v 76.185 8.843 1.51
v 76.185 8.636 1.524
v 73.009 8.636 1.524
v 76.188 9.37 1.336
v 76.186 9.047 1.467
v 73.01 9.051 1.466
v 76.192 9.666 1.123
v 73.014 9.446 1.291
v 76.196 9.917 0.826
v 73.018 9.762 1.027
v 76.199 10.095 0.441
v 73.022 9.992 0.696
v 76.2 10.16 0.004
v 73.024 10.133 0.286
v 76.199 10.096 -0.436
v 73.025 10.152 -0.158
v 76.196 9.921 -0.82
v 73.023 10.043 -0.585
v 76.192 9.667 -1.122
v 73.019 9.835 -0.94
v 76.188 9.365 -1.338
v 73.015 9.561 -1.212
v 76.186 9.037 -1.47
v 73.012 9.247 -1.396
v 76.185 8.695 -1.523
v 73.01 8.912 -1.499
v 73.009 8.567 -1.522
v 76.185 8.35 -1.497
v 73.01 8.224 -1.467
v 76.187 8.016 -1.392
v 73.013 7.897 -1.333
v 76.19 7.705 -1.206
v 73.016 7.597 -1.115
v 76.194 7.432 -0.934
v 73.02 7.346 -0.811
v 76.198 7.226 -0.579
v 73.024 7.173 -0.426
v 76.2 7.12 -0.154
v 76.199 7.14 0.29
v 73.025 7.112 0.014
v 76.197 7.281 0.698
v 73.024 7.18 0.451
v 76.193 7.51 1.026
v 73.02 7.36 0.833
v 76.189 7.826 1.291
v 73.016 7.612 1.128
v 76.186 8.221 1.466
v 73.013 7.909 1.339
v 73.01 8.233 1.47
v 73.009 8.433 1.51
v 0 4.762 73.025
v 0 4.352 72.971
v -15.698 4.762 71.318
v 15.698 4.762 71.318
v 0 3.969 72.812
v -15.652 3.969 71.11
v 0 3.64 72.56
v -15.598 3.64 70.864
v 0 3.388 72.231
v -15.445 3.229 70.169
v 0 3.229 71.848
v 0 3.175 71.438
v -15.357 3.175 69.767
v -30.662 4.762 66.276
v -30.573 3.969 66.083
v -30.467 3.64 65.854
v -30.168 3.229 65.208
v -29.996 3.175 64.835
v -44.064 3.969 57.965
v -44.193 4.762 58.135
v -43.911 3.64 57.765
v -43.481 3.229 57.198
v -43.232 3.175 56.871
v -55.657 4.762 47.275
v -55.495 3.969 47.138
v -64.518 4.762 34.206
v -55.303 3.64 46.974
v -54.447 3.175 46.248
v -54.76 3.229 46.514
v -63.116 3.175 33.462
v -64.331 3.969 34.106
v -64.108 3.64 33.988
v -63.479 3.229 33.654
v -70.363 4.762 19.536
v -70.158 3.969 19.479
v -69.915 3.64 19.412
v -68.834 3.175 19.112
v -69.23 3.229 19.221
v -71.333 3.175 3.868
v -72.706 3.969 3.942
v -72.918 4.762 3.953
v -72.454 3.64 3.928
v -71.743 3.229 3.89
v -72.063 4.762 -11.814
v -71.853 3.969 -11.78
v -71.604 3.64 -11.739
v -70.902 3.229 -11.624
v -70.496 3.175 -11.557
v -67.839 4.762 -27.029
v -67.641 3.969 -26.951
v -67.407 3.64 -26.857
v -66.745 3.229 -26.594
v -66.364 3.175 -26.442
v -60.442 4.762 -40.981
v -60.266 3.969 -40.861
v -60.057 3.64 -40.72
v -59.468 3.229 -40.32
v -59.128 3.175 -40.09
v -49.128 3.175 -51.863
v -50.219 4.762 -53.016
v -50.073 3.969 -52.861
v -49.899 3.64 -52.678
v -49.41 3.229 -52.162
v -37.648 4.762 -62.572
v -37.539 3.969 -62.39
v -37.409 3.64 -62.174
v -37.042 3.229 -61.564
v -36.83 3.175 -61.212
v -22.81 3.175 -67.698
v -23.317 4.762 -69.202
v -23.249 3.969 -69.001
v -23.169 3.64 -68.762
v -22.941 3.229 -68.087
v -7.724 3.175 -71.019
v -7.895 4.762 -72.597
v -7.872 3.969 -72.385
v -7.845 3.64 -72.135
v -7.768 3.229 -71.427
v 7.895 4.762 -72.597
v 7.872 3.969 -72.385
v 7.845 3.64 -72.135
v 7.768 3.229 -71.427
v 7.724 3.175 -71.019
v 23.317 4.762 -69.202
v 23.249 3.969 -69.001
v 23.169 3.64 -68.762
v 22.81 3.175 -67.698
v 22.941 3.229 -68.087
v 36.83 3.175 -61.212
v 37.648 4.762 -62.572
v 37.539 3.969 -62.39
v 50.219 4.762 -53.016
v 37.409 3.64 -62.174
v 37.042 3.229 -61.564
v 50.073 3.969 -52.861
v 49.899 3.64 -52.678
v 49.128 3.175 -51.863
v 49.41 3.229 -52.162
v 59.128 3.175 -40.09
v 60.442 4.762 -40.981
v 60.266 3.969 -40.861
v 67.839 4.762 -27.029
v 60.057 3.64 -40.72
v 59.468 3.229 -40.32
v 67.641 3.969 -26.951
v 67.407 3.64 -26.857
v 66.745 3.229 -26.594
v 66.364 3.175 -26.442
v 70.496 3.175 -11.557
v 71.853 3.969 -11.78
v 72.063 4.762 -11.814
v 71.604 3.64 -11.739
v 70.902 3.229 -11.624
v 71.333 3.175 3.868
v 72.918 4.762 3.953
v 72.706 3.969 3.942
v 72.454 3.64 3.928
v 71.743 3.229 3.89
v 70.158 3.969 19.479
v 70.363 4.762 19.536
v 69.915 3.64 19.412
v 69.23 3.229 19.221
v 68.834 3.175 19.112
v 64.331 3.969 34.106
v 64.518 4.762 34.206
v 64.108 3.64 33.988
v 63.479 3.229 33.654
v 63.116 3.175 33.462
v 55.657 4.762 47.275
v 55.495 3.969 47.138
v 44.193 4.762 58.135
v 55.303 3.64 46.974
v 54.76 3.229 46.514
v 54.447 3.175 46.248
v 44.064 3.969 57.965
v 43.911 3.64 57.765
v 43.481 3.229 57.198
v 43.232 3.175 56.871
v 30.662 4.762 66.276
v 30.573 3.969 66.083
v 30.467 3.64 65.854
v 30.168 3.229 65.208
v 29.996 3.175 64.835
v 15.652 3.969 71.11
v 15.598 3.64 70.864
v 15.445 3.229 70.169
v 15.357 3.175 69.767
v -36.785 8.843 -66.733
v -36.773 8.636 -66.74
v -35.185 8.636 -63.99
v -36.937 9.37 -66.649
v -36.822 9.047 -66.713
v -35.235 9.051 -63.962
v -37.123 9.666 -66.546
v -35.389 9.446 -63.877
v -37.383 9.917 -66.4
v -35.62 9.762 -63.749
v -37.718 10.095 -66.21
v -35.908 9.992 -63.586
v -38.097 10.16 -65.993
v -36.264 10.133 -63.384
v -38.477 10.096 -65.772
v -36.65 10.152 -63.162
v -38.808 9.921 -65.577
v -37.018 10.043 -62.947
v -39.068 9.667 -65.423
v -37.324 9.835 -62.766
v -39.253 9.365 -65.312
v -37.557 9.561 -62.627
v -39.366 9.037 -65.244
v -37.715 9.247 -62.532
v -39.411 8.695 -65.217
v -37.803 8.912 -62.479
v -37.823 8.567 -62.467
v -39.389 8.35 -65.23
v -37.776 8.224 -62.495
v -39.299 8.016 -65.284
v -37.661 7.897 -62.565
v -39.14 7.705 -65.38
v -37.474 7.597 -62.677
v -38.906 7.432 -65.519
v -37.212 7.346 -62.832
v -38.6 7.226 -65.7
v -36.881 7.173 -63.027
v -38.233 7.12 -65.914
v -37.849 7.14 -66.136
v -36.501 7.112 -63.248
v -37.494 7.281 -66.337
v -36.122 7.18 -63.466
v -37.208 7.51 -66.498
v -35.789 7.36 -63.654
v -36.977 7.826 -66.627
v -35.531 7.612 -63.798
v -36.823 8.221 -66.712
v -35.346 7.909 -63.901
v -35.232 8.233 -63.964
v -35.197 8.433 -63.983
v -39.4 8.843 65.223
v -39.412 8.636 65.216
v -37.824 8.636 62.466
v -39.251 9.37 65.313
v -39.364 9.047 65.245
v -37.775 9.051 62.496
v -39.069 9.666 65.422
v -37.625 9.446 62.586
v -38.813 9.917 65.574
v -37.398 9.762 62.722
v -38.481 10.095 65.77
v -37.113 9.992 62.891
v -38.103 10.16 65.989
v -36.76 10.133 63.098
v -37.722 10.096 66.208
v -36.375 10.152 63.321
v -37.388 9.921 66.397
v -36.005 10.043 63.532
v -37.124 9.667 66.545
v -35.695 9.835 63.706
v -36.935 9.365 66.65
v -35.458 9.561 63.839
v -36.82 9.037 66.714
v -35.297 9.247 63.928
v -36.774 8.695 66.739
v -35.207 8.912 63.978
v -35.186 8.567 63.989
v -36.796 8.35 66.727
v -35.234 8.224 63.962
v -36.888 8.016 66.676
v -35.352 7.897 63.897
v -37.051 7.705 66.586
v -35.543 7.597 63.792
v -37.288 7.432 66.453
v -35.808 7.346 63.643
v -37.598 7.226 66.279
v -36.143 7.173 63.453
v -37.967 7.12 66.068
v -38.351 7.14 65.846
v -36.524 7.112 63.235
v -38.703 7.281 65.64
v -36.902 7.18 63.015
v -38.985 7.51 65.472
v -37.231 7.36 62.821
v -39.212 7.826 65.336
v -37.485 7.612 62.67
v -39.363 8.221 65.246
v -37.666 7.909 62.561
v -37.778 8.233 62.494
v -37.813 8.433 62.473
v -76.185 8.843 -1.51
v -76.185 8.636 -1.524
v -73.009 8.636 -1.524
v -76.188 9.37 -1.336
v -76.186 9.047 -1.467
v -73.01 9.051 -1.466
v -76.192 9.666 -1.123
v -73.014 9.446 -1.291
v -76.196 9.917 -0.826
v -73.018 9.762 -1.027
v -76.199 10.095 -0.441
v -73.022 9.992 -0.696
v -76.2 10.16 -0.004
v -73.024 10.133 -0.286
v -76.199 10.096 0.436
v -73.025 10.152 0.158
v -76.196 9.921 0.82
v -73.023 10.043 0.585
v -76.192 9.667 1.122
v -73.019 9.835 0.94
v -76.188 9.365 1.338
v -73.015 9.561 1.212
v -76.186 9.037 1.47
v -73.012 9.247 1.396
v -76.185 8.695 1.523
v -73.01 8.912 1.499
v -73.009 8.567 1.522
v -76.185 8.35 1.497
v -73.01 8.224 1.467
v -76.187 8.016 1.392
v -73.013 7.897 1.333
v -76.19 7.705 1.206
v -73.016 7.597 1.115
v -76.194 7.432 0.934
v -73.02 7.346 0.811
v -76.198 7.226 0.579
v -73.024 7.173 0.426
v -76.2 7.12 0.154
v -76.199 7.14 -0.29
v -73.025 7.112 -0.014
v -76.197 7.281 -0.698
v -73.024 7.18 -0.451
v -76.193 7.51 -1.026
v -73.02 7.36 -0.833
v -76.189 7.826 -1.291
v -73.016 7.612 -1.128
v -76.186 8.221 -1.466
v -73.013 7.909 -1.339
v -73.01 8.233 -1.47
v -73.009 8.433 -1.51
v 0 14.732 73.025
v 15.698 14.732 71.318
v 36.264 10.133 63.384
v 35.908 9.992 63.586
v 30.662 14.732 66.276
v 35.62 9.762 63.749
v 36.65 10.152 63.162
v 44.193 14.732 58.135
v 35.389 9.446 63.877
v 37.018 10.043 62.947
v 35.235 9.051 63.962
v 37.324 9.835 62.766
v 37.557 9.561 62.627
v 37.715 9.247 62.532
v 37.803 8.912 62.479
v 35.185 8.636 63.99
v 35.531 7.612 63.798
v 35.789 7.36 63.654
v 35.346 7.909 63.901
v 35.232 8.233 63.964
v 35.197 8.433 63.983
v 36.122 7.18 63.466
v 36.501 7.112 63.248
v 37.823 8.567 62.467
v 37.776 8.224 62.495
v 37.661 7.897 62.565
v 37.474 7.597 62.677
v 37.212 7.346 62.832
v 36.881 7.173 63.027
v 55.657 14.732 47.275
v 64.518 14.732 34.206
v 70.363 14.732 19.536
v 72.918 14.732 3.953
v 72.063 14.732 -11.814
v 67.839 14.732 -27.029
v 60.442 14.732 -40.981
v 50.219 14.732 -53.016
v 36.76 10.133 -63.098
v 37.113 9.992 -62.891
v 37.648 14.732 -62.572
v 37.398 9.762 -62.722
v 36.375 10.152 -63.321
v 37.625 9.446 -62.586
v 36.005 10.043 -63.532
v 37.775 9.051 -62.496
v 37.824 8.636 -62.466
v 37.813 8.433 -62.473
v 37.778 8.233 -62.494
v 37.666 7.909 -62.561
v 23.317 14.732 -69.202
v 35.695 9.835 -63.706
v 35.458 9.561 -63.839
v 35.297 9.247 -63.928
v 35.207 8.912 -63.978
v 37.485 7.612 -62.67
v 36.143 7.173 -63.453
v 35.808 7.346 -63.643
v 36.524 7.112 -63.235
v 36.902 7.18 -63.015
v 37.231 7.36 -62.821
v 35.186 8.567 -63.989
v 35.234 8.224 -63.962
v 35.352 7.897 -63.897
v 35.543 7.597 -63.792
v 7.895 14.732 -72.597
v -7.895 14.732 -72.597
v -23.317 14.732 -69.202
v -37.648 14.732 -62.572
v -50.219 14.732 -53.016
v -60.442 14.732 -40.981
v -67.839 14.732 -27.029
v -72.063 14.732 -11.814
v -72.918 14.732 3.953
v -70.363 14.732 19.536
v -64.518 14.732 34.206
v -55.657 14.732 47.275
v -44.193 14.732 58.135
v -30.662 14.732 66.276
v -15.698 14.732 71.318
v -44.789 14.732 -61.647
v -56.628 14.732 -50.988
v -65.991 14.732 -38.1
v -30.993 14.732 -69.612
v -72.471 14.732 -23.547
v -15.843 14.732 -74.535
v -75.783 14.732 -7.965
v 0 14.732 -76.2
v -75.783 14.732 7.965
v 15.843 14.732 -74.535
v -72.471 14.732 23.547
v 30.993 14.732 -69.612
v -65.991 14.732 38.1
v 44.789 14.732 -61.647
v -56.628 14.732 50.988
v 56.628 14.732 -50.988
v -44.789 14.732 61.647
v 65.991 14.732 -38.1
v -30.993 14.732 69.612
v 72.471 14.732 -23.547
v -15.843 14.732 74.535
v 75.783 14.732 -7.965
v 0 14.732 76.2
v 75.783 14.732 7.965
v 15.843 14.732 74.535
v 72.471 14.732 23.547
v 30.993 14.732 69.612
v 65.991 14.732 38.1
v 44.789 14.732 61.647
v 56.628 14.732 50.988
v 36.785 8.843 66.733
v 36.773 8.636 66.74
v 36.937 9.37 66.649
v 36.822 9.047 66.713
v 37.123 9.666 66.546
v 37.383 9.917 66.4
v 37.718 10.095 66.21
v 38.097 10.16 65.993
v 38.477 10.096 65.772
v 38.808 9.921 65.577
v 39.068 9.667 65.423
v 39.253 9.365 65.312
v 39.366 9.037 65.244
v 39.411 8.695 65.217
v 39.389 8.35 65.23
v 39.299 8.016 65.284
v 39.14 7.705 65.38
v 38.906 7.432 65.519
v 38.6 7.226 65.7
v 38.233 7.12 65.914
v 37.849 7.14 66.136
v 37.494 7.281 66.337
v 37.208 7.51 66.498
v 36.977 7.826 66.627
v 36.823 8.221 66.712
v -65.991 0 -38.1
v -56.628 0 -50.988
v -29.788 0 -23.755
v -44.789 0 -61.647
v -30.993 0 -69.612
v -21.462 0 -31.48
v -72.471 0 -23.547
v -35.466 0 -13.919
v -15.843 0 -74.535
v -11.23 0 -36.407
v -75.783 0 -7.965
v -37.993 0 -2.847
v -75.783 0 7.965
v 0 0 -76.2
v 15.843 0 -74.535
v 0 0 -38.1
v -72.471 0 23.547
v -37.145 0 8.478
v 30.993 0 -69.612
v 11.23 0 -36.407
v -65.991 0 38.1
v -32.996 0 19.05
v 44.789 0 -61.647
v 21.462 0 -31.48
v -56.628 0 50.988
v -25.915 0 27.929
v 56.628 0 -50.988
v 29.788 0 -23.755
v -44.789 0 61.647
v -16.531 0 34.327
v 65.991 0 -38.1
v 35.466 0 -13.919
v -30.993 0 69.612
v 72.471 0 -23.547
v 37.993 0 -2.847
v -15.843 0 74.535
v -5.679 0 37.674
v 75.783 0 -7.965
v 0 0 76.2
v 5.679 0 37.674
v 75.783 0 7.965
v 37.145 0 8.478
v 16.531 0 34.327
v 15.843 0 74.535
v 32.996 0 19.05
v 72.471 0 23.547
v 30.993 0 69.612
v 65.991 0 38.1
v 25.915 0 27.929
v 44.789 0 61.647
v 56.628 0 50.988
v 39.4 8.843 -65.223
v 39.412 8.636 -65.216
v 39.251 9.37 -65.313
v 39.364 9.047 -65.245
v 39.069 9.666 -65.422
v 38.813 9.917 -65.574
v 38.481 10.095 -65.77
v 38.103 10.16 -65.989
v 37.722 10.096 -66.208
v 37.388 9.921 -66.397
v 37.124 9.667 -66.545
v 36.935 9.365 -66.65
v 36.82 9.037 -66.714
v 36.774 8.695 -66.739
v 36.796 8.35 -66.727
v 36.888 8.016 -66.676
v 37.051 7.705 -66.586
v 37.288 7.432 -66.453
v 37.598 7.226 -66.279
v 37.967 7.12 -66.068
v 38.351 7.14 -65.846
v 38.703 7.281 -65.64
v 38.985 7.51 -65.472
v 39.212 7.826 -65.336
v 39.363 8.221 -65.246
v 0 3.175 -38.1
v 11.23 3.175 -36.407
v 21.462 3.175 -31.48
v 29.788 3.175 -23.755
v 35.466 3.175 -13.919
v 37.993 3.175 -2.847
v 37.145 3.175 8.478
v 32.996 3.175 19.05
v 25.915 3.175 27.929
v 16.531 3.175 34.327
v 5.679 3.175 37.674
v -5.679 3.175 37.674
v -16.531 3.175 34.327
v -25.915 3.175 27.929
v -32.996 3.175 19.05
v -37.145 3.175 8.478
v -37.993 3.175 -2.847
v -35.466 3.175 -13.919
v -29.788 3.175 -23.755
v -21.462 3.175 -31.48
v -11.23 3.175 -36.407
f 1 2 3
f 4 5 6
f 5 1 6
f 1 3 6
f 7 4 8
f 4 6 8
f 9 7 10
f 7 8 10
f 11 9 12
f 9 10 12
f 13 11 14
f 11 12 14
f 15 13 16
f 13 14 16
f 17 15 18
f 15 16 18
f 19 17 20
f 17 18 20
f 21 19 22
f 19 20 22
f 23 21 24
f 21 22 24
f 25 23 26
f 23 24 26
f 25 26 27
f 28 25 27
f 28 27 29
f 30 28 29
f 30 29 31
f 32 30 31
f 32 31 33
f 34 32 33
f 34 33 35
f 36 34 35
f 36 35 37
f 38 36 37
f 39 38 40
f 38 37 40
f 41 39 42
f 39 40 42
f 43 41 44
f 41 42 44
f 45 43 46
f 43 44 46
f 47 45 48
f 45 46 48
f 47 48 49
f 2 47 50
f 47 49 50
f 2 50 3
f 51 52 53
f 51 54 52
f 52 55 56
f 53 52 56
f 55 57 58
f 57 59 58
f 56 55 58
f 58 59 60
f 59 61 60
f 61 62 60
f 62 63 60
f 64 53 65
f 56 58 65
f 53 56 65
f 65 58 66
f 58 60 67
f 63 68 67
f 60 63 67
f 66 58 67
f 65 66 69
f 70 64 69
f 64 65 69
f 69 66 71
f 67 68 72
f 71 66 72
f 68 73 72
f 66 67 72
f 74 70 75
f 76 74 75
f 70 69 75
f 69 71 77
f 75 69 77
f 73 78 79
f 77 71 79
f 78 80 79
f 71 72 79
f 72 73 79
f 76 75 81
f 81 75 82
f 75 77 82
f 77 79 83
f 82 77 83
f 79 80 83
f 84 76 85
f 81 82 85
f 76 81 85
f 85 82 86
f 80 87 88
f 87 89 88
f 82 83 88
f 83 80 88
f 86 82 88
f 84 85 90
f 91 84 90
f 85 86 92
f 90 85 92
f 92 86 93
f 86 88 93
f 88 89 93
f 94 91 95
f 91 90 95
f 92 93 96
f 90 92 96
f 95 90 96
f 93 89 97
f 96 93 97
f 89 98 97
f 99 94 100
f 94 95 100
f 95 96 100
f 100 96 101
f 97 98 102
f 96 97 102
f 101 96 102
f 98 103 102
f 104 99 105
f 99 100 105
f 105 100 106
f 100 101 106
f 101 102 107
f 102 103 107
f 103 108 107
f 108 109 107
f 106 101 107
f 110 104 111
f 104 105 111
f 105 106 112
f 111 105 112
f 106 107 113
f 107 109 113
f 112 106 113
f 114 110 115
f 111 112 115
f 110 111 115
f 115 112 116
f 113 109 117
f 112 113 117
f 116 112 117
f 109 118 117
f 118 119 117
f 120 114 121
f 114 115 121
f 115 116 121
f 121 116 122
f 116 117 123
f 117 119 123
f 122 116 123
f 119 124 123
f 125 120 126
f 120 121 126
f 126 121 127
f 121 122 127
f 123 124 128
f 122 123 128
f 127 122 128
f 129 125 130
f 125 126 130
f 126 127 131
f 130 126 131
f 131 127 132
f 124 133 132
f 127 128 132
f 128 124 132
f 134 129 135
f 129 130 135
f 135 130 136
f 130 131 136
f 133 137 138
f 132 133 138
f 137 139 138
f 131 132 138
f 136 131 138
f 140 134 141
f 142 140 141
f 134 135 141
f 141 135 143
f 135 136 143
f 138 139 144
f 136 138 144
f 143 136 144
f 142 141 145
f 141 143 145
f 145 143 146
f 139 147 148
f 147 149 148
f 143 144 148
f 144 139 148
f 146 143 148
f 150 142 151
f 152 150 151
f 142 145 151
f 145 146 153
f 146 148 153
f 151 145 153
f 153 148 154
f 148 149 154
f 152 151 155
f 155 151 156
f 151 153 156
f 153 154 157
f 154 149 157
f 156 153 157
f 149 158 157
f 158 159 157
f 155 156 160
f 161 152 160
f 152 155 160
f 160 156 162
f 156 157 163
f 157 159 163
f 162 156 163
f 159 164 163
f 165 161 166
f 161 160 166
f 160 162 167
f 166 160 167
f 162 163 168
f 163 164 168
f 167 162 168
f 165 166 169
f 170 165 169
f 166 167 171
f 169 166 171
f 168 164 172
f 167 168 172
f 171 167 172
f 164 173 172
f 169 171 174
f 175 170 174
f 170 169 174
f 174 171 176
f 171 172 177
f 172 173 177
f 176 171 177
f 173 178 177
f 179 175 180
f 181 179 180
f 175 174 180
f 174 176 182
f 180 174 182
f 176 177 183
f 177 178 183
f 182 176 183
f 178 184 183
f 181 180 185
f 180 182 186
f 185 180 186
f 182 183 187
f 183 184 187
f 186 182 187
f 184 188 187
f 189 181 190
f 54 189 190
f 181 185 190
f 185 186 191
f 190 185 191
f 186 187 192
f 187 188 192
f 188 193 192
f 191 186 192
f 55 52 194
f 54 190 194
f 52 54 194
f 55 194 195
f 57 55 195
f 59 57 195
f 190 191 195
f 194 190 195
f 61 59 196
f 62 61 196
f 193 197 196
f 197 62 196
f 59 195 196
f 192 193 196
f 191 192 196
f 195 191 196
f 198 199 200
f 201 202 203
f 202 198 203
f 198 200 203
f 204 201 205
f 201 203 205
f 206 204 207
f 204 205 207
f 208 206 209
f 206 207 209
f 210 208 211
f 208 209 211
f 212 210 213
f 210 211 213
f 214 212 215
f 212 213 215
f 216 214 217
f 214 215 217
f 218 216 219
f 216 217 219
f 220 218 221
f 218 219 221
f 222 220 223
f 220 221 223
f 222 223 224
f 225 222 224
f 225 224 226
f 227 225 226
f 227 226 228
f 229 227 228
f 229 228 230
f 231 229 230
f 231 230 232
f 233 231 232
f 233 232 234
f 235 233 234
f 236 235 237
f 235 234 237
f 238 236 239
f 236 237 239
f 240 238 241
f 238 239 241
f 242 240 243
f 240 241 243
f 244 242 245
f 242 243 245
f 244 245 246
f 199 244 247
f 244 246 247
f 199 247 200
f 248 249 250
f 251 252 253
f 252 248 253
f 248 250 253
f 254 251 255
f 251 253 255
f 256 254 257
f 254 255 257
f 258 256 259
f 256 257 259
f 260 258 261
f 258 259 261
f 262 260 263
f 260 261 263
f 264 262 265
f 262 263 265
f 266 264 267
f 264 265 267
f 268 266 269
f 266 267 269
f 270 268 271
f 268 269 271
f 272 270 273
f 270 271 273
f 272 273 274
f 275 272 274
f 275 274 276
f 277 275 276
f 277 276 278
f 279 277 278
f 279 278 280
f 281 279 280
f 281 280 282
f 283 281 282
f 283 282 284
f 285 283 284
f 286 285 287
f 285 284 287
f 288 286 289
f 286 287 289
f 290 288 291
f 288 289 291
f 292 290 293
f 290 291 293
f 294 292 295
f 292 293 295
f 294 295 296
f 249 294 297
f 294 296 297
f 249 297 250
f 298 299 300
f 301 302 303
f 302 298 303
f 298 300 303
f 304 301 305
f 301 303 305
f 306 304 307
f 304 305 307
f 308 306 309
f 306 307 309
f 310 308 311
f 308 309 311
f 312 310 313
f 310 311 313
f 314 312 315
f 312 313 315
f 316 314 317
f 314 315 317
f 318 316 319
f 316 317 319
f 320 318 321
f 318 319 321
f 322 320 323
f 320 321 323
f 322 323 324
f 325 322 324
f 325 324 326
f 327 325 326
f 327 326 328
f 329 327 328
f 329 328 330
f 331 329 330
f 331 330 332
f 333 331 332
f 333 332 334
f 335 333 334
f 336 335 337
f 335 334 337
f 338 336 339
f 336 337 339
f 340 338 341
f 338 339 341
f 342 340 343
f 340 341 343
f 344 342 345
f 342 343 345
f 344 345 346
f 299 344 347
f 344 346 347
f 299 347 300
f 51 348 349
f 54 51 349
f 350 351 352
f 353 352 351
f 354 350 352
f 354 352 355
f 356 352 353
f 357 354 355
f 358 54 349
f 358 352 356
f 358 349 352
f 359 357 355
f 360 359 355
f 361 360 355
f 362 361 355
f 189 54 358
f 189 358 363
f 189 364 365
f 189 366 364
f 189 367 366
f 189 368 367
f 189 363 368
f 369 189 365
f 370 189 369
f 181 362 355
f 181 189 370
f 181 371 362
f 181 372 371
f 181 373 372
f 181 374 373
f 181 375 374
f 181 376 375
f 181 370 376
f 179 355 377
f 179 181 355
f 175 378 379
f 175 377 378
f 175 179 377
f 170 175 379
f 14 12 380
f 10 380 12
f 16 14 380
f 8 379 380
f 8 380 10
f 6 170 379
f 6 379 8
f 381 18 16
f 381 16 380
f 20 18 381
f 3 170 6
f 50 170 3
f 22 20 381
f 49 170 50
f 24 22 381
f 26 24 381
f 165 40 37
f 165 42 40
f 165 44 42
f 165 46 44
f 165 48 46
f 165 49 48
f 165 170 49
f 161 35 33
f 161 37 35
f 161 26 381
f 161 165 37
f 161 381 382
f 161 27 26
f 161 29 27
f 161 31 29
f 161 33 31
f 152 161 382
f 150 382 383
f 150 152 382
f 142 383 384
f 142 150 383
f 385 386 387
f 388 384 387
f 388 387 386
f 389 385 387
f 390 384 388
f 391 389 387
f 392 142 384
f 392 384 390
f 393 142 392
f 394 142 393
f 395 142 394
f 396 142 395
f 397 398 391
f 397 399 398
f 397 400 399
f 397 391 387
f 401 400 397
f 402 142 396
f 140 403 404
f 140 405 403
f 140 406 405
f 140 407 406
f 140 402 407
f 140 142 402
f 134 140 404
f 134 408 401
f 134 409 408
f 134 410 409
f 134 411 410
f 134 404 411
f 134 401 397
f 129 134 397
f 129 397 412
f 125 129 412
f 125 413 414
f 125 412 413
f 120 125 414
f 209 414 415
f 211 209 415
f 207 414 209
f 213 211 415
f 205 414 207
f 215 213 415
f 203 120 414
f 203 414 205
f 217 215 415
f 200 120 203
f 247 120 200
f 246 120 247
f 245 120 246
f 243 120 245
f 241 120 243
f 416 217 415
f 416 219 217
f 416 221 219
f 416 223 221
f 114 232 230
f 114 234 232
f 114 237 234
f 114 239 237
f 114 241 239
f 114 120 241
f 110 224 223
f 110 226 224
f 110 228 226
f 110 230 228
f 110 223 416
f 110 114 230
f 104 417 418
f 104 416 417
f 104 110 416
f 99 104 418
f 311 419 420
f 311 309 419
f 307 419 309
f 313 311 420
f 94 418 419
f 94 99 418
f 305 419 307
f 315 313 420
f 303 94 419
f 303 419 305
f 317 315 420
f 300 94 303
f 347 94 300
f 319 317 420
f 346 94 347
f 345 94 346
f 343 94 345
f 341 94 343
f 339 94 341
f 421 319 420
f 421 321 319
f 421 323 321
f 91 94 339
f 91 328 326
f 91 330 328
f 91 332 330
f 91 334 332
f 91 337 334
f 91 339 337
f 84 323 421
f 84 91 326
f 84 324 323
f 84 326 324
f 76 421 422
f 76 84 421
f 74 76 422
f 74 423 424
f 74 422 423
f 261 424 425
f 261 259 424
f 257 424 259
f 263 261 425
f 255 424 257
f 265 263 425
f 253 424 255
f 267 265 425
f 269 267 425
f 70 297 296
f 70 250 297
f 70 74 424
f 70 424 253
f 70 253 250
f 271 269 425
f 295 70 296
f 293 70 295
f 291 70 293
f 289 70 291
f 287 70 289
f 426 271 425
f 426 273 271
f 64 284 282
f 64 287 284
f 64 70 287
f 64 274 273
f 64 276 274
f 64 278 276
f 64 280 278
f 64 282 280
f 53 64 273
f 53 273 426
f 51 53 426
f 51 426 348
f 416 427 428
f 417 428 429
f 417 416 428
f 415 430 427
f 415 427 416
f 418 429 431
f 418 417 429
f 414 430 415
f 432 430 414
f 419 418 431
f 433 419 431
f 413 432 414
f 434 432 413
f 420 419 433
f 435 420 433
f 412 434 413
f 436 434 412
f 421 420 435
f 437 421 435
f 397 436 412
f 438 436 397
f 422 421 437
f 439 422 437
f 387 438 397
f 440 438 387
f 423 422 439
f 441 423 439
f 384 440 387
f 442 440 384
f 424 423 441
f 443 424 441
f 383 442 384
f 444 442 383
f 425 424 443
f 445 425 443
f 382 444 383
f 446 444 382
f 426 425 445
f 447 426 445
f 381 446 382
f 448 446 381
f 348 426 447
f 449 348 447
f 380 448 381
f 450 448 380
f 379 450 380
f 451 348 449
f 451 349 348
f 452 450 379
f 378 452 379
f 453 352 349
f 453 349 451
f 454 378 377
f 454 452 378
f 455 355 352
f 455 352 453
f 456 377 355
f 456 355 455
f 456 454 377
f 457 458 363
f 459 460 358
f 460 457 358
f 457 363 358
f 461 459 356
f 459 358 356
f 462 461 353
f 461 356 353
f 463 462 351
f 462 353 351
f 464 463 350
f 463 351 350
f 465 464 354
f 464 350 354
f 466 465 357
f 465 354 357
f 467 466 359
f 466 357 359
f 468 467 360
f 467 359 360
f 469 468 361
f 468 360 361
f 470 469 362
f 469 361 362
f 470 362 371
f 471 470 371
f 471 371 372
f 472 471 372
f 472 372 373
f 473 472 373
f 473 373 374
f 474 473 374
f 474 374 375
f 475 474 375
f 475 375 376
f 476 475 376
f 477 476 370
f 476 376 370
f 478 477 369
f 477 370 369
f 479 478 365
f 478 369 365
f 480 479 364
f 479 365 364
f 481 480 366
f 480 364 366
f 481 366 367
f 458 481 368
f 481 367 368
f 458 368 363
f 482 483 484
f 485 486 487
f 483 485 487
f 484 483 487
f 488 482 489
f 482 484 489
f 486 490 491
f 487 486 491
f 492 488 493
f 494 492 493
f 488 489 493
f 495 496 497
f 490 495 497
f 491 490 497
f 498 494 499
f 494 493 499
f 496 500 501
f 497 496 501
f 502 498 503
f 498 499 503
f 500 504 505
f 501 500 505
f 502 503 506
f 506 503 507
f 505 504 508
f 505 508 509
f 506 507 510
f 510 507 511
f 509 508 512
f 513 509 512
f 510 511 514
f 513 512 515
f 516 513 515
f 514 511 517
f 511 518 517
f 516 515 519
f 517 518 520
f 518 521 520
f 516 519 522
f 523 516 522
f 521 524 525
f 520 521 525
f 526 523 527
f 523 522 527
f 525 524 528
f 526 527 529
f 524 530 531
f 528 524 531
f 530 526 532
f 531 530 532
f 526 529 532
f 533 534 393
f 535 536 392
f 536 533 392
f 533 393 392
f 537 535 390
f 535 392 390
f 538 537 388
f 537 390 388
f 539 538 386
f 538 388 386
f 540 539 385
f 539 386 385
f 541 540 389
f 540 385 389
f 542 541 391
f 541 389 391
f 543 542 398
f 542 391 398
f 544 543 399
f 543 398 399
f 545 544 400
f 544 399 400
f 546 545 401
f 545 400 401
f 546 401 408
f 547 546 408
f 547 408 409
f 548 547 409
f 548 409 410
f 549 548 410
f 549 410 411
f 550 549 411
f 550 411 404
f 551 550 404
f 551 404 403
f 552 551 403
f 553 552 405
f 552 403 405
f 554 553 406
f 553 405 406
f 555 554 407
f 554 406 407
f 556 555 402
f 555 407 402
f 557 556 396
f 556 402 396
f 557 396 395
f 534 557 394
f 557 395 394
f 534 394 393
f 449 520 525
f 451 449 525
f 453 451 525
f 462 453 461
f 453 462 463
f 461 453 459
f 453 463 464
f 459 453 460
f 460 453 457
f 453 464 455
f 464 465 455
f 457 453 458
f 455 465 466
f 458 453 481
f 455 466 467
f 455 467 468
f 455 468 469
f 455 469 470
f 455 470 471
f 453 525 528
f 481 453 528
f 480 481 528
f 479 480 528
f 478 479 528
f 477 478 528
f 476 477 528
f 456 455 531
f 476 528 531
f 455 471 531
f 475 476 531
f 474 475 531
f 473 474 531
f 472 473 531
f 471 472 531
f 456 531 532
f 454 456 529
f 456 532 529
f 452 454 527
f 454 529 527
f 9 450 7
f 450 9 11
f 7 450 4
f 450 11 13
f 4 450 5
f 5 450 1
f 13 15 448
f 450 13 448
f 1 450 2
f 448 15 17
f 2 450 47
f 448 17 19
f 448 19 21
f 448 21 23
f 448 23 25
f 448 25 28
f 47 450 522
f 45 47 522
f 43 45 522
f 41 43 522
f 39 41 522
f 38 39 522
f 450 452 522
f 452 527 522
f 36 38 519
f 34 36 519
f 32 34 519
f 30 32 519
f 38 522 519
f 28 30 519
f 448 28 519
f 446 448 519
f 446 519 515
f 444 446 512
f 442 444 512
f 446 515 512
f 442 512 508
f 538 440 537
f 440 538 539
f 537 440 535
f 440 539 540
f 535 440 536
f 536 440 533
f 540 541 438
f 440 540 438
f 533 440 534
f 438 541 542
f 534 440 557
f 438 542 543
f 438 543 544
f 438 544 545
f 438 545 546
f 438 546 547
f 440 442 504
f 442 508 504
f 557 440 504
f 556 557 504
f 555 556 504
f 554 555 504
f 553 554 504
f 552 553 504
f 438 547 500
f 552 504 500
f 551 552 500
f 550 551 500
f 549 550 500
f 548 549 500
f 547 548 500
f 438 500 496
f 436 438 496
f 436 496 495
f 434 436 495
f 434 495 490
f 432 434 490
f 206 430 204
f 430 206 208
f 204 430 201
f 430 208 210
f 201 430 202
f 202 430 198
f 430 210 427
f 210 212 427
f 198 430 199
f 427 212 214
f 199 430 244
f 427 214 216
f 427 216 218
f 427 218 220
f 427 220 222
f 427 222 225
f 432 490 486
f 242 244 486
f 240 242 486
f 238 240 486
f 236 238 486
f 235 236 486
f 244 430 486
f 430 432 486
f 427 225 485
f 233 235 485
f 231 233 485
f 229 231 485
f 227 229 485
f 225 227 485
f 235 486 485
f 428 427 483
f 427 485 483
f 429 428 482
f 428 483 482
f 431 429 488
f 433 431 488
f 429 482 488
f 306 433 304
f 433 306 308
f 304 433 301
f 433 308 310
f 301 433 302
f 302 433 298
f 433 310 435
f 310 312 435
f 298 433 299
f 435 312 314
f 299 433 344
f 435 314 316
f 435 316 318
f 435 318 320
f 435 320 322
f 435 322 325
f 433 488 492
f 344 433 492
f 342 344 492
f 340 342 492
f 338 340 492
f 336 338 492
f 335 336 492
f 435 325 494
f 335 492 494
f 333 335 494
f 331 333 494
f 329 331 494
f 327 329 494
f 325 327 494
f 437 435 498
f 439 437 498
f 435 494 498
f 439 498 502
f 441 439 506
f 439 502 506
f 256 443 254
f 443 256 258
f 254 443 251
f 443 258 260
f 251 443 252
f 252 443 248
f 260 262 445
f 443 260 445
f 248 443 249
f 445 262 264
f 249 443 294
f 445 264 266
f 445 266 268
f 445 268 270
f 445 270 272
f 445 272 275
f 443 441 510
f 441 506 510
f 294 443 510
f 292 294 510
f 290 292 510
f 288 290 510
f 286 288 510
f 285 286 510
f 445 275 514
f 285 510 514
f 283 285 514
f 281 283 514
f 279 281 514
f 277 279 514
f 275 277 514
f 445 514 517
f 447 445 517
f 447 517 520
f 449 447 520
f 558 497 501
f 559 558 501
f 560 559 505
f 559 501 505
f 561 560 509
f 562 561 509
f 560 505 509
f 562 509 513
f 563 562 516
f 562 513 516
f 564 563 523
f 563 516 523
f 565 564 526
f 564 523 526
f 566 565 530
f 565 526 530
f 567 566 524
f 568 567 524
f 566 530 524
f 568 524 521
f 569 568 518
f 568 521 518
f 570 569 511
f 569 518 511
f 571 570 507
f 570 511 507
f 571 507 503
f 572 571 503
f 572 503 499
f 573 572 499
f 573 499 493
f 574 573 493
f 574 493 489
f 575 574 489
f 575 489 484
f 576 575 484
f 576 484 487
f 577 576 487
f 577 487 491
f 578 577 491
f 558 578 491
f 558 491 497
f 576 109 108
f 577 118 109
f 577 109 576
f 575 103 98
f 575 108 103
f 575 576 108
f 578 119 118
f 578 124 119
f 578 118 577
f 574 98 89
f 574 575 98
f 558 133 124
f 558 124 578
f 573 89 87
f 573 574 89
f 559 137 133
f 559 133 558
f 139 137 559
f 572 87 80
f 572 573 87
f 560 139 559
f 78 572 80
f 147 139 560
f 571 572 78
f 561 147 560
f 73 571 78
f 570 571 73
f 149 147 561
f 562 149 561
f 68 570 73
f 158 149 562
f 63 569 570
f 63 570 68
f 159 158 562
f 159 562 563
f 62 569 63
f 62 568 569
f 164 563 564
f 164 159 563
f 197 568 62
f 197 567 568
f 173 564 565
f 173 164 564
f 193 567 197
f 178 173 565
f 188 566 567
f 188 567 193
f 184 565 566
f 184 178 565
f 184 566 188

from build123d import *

# Parameters (mm, degrees)
SKETCH1_R           = 76.2
BOSS_EXTRUDE1_DEPTH = 16.256
SHELL1_T            = -3.175
FILLET1_R           = 1.5875
SKETCH2_R           = 38.1
CUT_EXTRUDE1_DEPTH  = 16.256
SKETCH3_R           = 1.524
CUT_EXTRUDE2_DEPTH  = 76.2
CIRPATTERN1_COUNT   = 6
CUT_EXTRUDE4_START  = -1.524
SKETCH5_R           = 76.2
CUT_EXTRUDE4_DEPTH  = 1.524


with BuildPart() as part:
    # Sketch1 → Boss-Extrude1 (new body)
    with BuildSketch(Plane(origin=(0, 0, 0), x_dir=(1, 0, 0), z_dir=(0, 1, 0))):
        with Locations(Location((0, 0, 0), (0, 0, 270))):
            Circle(SKETCH1_R)
    extrude(amount=BOSS_EXTRUDE1_DEPTH)

    # Shell1
    shell1_openings = [part.faces().sort_by_distance(p)[0] for p in [
        (0, 16.256, 0),
    ]]
    offset(amount=SHELL1_T, openings=shell1_openings, kind=Kind.INTERSECTION)

    # Fillet1
    fillet1_edges = [part.edges().sort_by_distance(p)[0] for p in [
        (0, 3.175, -73.025),
    ]]
    fillet(fillet1_edges, radius=FILLET1_R)

    # Sketch2 → Cut-Extrude1 (cut)
    with BuildSketch(Plane.XZ):
        with Locations(Location((0, 0, 0), (0, 0, 270))):
            Circle(SKETCH2_R)
    extrude(amount=-CUT_EXTRUDE1_DEPTH, mode=Mode.SUBTRACT)

    # Sketch3 → Cut-Extrude2 (cut)
    with BuildSketch(Plane(origin=(0, 0, 0), x_dir=(0, 0, -1), z_dir=(1, 0, 0))):
        with Locations((0, 8.636)):
            Circle(SKETCH3_R)
    cut_extrude2 = extrude(amount=-CUT_EXTRUDE2_DEPTH, mode=Mode.SUBTRACT)

    # CirPattern1: Cut-Extrude2 ×6 about axis
    cirpattern1_axis = Axis((0, 16.256, 0), (0, -1, 0))
    for i in range(1, CIRPATTERN1_COUNT):
        add(cut_extrude2.rotate(cirpattern1_axis, i * 360 / CIRPATTERN1_COUNT), mode=Mode.SUBTRACT)

    # Sketch5 → Cut-Extrude4 (cut)
    with BuildSketch(Plane(origin=(0, 16.256, 0), x_dir=(1, 0, 0), z_dir=(0, 1, 0)).offset(CUT_EXTRUDE4_START)):
        with Locations(Location((0, 0, 0), (0, 0, 270))):
            Circle(SKETCH5_R)
    extrude(amount=CUT_EXTRUDE4_DEPTH, mode=Mode.SUBTRACT)


solid = part.part
